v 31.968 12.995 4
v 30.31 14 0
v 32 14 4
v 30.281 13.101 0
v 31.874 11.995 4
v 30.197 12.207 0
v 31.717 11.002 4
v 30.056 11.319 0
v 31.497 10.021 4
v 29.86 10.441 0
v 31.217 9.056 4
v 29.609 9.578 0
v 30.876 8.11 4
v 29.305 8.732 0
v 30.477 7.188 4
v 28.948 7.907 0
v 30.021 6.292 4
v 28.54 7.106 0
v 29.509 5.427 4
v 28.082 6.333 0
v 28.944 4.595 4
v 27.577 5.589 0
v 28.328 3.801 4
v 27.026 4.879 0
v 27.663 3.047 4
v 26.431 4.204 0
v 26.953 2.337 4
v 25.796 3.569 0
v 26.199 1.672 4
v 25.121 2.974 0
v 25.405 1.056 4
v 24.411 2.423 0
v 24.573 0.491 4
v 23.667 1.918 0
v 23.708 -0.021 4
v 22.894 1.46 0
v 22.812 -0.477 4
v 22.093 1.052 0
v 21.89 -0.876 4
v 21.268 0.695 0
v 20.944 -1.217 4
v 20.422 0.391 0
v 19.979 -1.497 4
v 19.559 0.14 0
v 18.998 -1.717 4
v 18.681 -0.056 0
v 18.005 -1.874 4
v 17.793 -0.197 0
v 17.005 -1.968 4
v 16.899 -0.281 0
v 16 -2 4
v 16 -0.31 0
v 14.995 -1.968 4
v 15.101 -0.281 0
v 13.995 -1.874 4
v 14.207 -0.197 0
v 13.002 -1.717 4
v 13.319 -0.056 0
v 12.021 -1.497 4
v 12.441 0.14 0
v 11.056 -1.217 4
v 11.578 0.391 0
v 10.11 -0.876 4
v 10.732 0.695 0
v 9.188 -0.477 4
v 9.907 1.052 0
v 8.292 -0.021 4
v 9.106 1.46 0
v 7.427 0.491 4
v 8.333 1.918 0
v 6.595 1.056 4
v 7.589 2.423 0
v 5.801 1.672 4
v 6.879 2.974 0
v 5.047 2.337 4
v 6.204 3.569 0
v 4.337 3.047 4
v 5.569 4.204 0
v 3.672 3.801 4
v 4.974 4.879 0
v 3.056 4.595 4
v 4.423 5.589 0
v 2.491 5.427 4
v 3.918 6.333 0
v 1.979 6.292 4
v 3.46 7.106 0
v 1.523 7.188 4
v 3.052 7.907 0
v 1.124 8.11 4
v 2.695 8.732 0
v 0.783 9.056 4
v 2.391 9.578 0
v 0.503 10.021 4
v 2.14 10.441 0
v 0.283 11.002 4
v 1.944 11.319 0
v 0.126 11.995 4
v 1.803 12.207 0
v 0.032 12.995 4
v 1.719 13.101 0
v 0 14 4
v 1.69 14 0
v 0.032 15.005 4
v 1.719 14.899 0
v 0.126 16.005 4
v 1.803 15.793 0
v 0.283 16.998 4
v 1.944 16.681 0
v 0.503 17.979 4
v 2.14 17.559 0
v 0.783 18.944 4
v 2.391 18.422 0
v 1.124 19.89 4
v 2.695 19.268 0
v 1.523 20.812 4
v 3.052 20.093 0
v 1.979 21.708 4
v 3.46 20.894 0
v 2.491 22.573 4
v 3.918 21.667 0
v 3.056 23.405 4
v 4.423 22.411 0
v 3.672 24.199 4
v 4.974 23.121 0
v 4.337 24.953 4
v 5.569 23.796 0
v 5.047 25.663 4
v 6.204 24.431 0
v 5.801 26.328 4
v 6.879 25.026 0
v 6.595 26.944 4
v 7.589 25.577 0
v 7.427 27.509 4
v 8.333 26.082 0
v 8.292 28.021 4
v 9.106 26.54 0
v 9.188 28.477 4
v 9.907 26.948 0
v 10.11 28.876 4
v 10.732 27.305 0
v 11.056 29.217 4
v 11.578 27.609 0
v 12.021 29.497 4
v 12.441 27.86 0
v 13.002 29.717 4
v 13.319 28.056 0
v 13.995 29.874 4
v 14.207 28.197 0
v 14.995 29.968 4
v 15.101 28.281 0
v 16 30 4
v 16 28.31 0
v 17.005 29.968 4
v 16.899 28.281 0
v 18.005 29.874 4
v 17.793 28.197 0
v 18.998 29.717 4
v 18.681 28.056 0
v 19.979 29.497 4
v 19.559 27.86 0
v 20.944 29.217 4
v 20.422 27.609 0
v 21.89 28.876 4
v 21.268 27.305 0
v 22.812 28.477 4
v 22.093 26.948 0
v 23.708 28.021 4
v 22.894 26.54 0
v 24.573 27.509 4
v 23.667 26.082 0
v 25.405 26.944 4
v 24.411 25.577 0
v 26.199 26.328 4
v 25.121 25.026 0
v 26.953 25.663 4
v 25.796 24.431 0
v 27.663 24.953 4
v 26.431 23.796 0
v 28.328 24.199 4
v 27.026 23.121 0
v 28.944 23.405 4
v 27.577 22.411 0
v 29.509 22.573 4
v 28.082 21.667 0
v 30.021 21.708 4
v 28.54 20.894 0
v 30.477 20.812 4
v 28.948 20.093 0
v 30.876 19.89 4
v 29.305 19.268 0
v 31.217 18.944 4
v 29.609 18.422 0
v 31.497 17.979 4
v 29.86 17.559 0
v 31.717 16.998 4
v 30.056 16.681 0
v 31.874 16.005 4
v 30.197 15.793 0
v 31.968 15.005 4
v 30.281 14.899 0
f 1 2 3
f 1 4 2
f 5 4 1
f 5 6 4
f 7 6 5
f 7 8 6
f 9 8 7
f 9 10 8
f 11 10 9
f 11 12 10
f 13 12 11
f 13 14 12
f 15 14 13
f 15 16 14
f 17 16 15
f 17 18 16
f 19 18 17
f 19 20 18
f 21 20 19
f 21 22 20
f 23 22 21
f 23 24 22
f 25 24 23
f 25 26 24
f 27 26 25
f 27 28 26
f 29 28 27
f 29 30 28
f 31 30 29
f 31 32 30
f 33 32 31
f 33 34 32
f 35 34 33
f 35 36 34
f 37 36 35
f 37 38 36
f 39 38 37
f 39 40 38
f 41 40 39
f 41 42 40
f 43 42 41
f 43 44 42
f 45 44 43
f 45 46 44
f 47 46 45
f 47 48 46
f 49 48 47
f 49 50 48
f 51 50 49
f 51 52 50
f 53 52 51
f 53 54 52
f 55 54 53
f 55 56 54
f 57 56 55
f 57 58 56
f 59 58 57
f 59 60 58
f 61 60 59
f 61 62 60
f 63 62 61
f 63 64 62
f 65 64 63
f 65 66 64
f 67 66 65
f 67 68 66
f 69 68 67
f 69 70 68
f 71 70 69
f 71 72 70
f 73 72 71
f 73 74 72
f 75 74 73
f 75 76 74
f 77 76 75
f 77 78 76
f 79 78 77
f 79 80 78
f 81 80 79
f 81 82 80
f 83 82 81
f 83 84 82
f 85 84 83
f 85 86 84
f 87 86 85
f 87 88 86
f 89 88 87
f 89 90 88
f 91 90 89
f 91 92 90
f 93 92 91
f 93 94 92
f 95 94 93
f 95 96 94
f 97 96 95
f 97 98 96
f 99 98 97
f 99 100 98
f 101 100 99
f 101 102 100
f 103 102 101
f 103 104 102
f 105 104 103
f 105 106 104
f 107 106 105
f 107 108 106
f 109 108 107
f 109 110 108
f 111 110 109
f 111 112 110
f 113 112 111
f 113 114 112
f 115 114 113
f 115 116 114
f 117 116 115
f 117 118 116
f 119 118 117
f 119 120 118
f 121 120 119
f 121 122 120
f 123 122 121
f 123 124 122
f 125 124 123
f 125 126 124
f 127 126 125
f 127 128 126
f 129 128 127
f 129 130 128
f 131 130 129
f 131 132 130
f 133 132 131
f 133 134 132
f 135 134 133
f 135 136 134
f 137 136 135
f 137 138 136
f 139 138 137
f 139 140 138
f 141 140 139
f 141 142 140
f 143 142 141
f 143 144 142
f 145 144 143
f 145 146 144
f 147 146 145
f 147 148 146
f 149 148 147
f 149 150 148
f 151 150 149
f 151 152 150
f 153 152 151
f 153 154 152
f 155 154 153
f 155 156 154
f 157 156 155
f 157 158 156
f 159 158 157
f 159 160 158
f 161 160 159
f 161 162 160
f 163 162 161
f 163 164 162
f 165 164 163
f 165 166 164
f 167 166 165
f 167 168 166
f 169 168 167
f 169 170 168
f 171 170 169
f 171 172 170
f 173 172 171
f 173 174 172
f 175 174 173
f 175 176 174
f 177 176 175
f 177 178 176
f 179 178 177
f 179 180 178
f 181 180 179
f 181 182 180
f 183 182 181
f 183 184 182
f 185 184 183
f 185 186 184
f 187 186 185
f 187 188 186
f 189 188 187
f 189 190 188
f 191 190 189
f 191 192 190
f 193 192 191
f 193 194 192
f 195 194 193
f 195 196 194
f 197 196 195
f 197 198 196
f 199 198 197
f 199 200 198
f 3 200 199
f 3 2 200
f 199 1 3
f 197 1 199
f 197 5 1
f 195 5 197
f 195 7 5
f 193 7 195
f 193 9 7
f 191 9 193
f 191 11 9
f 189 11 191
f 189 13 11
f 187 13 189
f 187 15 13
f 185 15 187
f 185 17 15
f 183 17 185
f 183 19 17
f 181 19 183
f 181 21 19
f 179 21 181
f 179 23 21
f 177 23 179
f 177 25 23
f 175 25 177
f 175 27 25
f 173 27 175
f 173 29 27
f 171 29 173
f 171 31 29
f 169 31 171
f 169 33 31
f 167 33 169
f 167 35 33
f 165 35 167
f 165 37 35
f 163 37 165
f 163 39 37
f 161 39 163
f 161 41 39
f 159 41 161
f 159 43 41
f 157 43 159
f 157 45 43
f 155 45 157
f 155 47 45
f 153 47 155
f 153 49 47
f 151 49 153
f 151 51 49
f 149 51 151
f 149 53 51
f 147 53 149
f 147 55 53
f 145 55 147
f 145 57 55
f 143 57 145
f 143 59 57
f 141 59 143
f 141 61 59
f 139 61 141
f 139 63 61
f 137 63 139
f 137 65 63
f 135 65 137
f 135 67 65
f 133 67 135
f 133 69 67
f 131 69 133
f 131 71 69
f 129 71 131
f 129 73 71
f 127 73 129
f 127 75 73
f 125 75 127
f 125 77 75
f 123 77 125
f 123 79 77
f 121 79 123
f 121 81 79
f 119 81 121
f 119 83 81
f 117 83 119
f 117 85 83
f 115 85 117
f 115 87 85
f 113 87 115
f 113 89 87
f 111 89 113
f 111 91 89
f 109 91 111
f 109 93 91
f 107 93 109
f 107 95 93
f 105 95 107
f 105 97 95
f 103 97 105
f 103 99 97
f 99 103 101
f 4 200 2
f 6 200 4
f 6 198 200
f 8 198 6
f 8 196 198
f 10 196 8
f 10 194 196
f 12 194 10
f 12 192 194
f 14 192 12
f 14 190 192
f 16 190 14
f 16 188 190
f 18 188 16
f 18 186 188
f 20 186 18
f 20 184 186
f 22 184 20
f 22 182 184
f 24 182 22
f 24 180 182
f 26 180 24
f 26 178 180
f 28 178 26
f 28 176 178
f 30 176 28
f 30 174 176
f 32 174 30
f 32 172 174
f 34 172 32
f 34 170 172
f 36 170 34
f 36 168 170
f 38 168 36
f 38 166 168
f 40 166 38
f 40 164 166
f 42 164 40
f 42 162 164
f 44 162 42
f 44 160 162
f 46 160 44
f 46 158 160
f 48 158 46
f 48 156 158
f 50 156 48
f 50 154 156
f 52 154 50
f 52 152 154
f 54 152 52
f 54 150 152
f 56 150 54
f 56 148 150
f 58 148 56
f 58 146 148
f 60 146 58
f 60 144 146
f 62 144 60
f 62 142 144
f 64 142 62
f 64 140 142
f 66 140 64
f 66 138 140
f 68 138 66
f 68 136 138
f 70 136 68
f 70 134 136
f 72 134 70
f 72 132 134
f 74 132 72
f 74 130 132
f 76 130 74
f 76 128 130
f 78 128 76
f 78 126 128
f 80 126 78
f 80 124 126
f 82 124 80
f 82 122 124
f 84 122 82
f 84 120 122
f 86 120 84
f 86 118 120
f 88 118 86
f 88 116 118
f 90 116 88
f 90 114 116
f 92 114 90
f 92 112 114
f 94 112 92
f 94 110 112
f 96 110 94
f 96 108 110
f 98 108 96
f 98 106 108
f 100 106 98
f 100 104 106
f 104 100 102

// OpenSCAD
// Customizable Miniature Base
// Created by Rob Ross, February 2014
//
// Derived from the "Customizable Stone Wall"
// Created by Ari M. Diacou, January 2014
// Shared under Creative Commons License: Attribution-ShareAlike 3.0 Unported (CC BY-SA 3.0) 
// see http://creativecommons.org/licenses/by-sa/3.0/
//
// Notes:
// - "have_topper" option is not working.
// - good: 40mm, num_x = 4, stone_offset = 2, master_seed=41, z_compression=1.1

// preview[view:south east, tilt:bottom]

/* [Base] */
// Width of base at the bottom (mm)
base_width = 32; // [25:60]
// Total height of base (mm)
base_height = 4; // [2:5]
// Angle of sidewall (0 degrees is vertical)
base_angle = 25;


// Whether or not to include the stone topper [0:1]
have_topper = 0; // [0:No,1:Yes]

/* [Stones] */
// Relative length of a stone
U=3;
// Relative width of a stone
W=2;
// Approx. number of stones along floor at widest point
num_x=4;
// Height of stones above base body
topper_height = 0.75;
// A way to save the arrangement of stones

/* [Tweaks] */
master_seed=41;
// Higher angles make more wedge-shaped stones, lower angles produce blocks. Reccomend 5-30 (zero crashes).
maximum_rotation_angle=5;
// Higher rotation angles might need more compression
z_compression=1.1;
// Offset shifts the stones in the Y direction, can help in placement
stone_offset=2;
// Width of lip between top of base and start of stones (mm)
lip_width = 0.3;
// In mm, reduces dimensions of base bottom to help it fit inside base exterior.
slop = 0.2;

/* [Hidden] */

// This is Ari's old "thickness" parameter, which doesn't need to be configurable.
V=1;
//The wall height in number of stones can be derived from other parameters
num_z= ceil(num_x / W * U);

// Split determines whether to bother to split the base into parts or not
split = 0;


/**** Main Routines ****/

if (split) {
	translate([-1 * base_width / 2, base_width / 2 - 2, 0]) base_bottom();
}

translate([0,base_width - 2, base_height + have_topper * topper_height]) rotate ([180,0,0]) 
{
if (have_topper) {
	union() {
		base_exterior();
		topper();
	}
}
else {
	base_exterior();
}
}

// base_exterior() - angled sides and top of base
module base_exterior()
{
	translate([base_width / 2, base_width / 2, 0])
	difference() {
		cylinder($fn=100, r1 = base_width / 2, 
			r2 = base_width / 2 -  base_height *sin(base_angle),
			h = base_height - have_topper * topper_height);
		if (split) {
			cylinder(r=base_width/2 - base_height * sin(base_angle) - 1,
				h = base_height - 1);	
		}
	}
}

// base_bottom() - flat bottom of base with space for magnets, etc.
module base_bottom()
{
	difference() {
		cylinder(r=base_width/2 - base_height * sin(base_angle) - 1 - slop/2,
			h = base_height - 1 - slop);
		translate([0,0,1]) cylinder(r=base_width/2 - base_height * sin(base_angle) - 2 - slop/2,
			h = base_height - 1 - slop);
	}
}

// topper() -- generates the flagstone topper using the raw_flagstones() module below.
module topper()
{
//	intersection() {
		translate([0,stone_offset,2]) rotate([-90,0,0]) raw_flagstones(base_width + 5);
//		translate([base_width / 2, base_width / 2, base_height - have_topper * topper_height]) 
%			cylinder(r=base_width/2 - base_height * sin(base_angle) - lip_width,
				h = topper_height);
//	}
}

// raw_flagstones() -- generates the floor of flagstones; used to be wall() in Ari's
//                     original version of this code.
module raw_flagstones(width) {
	dimensions=[U,V,W];
	half_dimensions=[U/2,V,W];

	scalefactor = width / (W * num_z);
	scale([scalefactor, scalefactor, scalefactor]) 
	union(){
			for(z=[0:num_z-1]){
				for(x=[0:num_x-1 + 1]){
						translate([U*(x+0.5-0.25*(1+pow(-1,z))), 0,z*W*z_compression]) 
							color("SlateGray")
								rock(dimensions,maximum_rotation_angle,num_x*z+x);
					}
				}
		}
}

// rock() -- generates a rock at origin. Slight adjustment (bug fix?) from Ari's version.
module rock(unit_dimension, max_rotation, seed)
{
	rotation_vector=rands(-max_rotation,max_rotation,3*3,seed*1000*master_seed);
	//echo( "rotation_vector: ",rotation_vector);
	intersection()
	{
		rotate([rotation_vector[1],rotation_vector[1+1],rotation_vector[1+2]]) 
			cube(unit_dimension,center=true);
		rotate([rotation_vector[4],rotation_vector[4+1],rotation_vector[4+2]]) 
			cube(unit_dimension,center=true);
		rotate([rotation_vector[7],rotation_vector[7+1],rotation_vector[7+2]]) 
			cube(unit_dimension,center=true);
	}
}
